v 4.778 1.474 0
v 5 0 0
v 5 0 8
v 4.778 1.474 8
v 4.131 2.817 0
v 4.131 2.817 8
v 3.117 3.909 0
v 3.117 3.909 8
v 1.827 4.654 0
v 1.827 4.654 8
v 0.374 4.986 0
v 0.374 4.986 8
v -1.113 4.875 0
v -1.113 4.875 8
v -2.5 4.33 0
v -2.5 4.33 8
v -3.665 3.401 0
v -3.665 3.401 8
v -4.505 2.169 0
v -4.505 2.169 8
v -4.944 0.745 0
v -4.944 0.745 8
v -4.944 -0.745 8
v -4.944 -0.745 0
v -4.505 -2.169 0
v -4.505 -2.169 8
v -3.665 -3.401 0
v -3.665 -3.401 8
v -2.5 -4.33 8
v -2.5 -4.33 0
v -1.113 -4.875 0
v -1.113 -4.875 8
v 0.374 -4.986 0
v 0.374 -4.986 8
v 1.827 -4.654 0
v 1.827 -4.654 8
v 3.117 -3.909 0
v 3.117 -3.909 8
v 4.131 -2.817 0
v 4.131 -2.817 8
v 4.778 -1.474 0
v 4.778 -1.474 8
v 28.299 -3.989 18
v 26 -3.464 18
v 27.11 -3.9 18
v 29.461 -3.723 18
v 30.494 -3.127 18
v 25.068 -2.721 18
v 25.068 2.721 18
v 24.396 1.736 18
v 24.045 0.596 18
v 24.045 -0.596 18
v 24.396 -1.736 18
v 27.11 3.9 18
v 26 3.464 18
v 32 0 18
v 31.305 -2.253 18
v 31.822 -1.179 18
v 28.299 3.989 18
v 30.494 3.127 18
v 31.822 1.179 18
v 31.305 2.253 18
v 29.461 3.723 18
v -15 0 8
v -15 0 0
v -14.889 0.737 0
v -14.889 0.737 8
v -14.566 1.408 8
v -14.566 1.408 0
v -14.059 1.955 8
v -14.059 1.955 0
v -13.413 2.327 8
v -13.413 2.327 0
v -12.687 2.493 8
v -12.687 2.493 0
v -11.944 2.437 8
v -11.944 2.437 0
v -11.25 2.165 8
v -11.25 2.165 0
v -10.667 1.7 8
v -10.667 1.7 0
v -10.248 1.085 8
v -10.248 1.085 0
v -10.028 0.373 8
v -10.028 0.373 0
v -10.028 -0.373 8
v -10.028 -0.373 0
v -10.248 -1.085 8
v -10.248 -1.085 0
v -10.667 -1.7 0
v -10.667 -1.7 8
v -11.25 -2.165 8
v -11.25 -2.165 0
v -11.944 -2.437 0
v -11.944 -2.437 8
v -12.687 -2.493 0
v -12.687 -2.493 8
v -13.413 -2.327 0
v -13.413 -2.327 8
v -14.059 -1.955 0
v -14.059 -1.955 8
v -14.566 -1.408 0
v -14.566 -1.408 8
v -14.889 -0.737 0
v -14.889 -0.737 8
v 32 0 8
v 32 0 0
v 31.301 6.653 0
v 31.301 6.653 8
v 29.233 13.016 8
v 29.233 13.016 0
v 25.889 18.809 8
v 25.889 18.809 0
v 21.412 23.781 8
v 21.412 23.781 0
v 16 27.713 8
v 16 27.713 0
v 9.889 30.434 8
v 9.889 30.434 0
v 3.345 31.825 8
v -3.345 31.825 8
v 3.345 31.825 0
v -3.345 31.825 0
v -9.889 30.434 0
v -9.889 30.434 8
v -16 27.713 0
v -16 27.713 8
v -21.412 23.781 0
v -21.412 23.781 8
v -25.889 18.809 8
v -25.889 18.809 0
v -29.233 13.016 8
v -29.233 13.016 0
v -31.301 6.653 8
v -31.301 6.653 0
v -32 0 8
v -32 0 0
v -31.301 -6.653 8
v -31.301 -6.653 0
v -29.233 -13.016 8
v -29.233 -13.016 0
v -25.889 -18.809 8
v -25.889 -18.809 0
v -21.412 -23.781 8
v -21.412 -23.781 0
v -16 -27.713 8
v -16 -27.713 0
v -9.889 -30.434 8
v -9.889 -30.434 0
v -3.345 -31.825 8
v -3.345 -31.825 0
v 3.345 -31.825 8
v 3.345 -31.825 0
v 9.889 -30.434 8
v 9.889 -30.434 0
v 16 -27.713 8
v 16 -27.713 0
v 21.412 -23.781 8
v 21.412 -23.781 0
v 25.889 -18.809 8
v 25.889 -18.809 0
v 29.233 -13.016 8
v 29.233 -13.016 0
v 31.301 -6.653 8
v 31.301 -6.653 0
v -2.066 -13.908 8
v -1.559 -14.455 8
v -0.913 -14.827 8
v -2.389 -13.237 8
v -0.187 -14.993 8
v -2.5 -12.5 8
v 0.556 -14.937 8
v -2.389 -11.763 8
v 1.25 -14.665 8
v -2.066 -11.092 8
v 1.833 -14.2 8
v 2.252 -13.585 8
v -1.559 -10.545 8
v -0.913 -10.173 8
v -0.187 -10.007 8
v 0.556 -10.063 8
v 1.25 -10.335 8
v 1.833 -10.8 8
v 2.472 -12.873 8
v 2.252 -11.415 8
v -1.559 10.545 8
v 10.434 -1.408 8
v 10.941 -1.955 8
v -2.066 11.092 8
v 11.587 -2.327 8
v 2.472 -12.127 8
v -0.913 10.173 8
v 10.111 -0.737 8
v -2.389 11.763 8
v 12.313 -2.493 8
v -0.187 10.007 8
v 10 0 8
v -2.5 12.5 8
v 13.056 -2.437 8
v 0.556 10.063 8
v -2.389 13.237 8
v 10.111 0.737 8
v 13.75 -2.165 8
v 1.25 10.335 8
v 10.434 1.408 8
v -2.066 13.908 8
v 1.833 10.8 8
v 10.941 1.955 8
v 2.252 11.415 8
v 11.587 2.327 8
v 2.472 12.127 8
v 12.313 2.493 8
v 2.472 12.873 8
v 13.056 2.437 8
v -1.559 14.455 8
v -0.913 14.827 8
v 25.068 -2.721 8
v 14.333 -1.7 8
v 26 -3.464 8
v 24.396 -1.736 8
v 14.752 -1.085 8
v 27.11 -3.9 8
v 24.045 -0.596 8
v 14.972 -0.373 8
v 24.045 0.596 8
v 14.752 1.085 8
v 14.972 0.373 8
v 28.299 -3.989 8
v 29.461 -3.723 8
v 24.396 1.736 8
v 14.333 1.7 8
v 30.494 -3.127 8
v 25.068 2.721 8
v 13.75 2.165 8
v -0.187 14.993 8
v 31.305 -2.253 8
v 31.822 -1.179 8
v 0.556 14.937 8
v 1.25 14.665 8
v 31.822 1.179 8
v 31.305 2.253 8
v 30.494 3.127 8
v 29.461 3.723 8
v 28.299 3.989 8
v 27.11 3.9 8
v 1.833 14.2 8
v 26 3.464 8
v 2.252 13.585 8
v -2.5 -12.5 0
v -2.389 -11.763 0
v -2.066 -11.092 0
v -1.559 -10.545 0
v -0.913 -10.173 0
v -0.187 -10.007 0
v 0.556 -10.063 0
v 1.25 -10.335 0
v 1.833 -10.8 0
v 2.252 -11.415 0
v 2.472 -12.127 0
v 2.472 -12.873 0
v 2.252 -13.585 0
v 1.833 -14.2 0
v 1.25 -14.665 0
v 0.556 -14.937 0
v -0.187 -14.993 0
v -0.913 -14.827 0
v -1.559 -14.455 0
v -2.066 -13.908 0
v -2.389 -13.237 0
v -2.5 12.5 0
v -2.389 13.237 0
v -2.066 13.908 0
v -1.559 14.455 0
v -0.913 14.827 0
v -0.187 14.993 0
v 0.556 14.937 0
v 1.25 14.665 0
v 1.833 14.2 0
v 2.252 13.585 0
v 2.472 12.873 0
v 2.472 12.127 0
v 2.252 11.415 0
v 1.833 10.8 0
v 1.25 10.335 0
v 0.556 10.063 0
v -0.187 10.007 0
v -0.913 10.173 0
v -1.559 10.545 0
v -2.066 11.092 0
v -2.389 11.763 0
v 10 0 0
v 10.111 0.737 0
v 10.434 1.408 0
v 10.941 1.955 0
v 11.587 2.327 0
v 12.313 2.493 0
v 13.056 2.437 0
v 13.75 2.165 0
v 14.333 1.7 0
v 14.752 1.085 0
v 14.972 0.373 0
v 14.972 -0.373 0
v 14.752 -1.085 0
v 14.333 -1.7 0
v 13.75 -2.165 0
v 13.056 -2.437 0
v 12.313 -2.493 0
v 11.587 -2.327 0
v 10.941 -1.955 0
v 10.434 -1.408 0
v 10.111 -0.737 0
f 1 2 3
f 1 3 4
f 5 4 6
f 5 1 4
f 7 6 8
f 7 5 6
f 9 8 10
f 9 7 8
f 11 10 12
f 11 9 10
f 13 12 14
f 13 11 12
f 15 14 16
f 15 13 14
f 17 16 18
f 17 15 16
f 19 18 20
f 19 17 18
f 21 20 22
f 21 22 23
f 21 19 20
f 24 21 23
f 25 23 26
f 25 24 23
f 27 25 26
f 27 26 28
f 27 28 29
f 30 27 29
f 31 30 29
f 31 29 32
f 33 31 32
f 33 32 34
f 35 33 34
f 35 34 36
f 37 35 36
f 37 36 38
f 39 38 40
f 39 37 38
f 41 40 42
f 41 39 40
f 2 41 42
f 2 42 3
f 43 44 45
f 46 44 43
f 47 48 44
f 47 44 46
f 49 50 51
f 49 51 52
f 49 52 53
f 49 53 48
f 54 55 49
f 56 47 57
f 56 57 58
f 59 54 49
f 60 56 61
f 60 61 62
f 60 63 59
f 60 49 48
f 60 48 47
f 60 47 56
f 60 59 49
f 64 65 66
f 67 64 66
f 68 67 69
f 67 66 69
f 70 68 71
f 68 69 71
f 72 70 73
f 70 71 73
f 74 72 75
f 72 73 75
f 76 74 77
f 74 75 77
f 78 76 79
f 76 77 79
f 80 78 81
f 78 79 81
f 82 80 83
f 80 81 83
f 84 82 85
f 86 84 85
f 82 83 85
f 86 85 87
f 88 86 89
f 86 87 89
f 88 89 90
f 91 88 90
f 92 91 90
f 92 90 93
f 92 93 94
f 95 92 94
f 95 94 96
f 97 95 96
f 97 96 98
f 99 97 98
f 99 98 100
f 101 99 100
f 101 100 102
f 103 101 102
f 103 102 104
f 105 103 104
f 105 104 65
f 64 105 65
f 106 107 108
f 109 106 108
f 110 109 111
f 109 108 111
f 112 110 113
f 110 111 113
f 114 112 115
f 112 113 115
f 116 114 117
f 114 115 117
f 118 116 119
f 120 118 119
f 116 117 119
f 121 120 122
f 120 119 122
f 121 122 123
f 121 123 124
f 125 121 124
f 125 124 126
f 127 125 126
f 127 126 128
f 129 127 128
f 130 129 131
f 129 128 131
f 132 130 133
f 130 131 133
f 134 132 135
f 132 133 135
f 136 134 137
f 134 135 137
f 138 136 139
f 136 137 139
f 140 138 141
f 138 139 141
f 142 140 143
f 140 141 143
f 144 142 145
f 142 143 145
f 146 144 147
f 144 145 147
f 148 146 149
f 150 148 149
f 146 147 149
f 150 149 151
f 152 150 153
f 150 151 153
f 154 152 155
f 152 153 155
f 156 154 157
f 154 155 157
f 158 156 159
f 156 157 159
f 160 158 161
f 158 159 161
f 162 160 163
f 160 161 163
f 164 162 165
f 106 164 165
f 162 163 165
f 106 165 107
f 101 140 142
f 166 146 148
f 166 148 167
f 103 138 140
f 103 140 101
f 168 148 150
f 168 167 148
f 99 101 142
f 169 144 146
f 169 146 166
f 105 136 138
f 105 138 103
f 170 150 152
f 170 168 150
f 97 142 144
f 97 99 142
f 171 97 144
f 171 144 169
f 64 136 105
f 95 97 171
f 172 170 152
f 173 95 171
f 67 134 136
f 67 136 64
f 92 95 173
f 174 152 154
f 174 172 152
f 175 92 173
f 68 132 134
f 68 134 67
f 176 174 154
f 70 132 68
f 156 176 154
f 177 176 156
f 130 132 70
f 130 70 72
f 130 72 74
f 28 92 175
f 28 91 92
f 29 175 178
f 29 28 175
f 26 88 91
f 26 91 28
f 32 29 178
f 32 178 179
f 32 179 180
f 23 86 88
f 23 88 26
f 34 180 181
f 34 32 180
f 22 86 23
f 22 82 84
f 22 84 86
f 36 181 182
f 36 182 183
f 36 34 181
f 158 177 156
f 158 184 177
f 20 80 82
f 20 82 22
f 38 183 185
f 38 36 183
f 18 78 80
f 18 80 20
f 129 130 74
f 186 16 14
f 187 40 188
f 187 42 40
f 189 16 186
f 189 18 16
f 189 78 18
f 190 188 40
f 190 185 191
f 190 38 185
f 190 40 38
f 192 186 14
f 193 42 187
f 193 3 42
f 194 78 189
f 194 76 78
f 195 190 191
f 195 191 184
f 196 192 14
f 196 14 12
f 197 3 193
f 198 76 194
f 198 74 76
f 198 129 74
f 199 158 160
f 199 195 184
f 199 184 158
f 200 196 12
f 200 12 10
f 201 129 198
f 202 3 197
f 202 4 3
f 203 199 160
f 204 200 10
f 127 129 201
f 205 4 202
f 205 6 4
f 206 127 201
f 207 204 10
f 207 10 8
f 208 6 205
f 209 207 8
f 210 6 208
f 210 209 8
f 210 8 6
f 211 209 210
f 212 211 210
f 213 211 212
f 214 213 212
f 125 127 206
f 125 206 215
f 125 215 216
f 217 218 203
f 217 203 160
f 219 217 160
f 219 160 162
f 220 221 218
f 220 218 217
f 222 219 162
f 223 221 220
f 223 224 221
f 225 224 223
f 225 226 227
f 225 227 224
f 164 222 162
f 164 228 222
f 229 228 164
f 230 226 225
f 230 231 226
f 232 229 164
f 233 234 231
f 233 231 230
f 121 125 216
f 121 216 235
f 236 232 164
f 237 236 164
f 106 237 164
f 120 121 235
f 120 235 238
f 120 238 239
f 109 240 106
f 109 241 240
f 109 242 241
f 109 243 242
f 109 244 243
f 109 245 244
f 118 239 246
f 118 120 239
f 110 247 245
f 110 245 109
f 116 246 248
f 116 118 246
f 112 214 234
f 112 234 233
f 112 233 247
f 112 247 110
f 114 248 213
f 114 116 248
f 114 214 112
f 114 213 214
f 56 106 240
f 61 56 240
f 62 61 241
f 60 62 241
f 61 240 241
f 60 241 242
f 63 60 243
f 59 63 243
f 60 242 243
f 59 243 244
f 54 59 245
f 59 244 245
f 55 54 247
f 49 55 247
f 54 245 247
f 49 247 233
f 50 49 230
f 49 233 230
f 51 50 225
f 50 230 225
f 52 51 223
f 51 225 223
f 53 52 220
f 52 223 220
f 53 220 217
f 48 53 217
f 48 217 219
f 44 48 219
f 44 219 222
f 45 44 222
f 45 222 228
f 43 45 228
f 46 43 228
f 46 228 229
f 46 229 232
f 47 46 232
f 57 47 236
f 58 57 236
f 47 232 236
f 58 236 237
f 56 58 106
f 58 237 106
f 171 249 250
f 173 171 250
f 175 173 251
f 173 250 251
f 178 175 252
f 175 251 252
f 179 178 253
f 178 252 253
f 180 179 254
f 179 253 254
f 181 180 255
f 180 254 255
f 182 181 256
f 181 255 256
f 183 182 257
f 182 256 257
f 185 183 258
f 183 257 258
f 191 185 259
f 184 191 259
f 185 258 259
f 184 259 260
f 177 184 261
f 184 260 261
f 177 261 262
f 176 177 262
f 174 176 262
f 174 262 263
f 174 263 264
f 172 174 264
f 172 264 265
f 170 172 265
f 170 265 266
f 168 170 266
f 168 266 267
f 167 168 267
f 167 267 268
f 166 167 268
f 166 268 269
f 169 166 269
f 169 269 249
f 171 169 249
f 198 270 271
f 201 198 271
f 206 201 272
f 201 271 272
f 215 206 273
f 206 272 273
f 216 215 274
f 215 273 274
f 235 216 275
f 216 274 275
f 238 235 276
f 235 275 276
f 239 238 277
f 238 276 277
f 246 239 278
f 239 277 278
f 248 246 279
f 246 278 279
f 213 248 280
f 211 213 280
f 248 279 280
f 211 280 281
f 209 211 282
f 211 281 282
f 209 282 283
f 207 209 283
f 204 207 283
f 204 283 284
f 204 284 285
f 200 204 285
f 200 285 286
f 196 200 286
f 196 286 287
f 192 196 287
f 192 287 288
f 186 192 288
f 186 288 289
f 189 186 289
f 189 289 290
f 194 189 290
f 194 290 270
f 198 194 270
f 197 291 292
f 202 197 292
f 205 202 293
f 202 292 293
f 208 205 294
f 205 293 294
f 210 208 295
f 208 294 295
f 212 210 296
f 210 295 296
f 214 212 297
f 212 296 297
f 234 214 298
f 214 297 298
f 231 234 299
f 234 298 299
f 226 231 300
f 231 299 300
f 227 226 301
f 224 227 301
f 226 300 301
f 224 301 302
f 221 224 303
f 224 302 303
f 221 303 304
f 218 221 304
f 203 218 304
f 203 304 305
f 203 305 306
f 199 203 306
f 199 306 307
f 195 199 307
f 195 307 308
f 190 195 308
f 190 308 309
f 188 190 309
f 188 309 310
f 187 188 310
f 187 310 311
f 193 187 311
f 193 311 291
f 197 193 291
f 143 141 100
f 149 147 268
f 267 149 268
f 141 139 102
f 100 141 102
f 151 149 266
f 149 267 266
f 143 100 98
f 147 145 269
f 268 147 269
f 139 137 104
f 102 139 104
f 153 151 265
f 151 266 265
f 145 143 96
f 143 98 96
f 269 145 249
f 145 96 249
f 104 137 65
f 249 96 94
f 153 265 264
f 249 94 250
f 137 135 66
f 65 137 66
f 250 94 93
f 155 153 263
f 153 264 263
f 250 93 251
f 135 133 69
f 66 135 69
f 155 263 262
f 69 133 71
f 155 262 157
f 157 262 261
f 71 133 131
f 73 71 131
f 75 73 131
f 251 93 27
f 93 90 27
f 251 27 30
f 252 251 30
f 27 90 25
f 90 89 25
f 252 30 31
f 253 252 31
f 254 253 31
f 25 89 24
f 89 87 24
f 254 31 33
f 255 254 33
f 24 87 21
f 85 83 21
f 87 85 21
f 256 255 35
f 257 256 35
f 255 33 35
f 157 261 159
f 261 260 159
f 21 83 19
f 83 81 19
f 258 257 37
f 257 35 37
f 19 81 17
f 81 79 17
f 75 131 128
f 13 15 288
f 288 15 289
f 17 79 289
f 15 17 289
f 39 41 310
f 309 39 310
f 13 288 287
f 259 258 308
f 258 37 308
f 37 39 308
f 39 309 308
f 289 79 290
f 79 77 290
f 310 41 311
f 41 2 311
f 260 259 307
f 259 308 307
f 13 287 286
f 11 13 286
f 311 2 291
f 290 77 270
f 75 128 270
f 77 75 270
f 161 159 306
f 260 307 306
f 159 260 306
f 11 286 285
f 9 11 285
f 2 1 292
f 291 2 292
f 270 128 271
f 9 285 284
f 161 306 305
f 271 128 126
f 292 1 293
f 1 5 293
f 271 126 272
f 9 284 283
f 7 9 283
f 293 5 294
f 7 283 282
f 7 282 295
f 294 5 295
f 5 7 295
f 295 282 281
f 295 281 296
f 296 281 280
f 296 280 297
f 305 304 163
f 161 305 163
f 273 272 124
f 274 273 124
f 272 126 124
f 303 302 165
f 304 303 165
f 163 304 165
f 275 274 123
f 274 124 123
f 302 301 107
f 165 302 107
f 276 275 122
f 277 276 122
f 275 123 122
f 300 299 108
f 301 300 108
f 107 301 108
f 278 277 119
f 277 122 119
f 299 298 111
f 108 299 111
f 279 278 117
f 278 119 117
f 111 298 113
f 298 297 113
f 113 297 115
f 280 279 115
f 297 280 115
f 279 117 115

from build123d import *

# Parameters (mm, degrees)
CROQUIS1_R              = 32
CROQUIS1_R_2            = 5
SALIENTE_EXTRUIR1_DEPTH = 8
CROQUIS3_R              = 2.5
CORTAR_EXTRUIR1_DEPTH   = 10
CROQUIS4_R              = 4
SALIENTE_EXTRUIR2_DEPTH = 10


with BuildPart() as part:
    # Croquis1 → Saliente-Extruir1 (new body)
    with BuildSketch(Plane.XY):
        Circle(CROQUIS1_R)
        Circle(CROQUIS1_R_2, mode=Mode.SUBTRACT)
    extrude(amount=SALIENTE_EXTRUIR1_DEPTH)

    # Croquis3 → Cortar-Extruir1 (cut)
    with BuildSketch(Plane(origin=(0, 0, 0), x_dir=(-1, 0, 0), z_dir=(0, 0, -1))):
        with Locations((12.5, 0)):
            Circle(CROQUIS3_R)
        with Locations((0, -12.5)):
            Circle(CROQUIS3_R)
        with Locations((-12.5, 0)):
            Circle(CROQUIS3_R)
        with Locations((0, 12.5)):
            Circle(CROQUIS3_R)
    extrude(amount=-CORTAR_EXTRUIR1_DEPTH, mode=Mode.SUBTRACT)

    # Croquis4 → Saliente-Extruir2 (add)
    with BuildSketch(Plane.XY.offset(8)):
        with Locations((28, 0)):
            Circle(CROQUIS4_R)
    extrude(amount=SALIENTE_EXTRUIR2_DEPTH)


solid = part.part
